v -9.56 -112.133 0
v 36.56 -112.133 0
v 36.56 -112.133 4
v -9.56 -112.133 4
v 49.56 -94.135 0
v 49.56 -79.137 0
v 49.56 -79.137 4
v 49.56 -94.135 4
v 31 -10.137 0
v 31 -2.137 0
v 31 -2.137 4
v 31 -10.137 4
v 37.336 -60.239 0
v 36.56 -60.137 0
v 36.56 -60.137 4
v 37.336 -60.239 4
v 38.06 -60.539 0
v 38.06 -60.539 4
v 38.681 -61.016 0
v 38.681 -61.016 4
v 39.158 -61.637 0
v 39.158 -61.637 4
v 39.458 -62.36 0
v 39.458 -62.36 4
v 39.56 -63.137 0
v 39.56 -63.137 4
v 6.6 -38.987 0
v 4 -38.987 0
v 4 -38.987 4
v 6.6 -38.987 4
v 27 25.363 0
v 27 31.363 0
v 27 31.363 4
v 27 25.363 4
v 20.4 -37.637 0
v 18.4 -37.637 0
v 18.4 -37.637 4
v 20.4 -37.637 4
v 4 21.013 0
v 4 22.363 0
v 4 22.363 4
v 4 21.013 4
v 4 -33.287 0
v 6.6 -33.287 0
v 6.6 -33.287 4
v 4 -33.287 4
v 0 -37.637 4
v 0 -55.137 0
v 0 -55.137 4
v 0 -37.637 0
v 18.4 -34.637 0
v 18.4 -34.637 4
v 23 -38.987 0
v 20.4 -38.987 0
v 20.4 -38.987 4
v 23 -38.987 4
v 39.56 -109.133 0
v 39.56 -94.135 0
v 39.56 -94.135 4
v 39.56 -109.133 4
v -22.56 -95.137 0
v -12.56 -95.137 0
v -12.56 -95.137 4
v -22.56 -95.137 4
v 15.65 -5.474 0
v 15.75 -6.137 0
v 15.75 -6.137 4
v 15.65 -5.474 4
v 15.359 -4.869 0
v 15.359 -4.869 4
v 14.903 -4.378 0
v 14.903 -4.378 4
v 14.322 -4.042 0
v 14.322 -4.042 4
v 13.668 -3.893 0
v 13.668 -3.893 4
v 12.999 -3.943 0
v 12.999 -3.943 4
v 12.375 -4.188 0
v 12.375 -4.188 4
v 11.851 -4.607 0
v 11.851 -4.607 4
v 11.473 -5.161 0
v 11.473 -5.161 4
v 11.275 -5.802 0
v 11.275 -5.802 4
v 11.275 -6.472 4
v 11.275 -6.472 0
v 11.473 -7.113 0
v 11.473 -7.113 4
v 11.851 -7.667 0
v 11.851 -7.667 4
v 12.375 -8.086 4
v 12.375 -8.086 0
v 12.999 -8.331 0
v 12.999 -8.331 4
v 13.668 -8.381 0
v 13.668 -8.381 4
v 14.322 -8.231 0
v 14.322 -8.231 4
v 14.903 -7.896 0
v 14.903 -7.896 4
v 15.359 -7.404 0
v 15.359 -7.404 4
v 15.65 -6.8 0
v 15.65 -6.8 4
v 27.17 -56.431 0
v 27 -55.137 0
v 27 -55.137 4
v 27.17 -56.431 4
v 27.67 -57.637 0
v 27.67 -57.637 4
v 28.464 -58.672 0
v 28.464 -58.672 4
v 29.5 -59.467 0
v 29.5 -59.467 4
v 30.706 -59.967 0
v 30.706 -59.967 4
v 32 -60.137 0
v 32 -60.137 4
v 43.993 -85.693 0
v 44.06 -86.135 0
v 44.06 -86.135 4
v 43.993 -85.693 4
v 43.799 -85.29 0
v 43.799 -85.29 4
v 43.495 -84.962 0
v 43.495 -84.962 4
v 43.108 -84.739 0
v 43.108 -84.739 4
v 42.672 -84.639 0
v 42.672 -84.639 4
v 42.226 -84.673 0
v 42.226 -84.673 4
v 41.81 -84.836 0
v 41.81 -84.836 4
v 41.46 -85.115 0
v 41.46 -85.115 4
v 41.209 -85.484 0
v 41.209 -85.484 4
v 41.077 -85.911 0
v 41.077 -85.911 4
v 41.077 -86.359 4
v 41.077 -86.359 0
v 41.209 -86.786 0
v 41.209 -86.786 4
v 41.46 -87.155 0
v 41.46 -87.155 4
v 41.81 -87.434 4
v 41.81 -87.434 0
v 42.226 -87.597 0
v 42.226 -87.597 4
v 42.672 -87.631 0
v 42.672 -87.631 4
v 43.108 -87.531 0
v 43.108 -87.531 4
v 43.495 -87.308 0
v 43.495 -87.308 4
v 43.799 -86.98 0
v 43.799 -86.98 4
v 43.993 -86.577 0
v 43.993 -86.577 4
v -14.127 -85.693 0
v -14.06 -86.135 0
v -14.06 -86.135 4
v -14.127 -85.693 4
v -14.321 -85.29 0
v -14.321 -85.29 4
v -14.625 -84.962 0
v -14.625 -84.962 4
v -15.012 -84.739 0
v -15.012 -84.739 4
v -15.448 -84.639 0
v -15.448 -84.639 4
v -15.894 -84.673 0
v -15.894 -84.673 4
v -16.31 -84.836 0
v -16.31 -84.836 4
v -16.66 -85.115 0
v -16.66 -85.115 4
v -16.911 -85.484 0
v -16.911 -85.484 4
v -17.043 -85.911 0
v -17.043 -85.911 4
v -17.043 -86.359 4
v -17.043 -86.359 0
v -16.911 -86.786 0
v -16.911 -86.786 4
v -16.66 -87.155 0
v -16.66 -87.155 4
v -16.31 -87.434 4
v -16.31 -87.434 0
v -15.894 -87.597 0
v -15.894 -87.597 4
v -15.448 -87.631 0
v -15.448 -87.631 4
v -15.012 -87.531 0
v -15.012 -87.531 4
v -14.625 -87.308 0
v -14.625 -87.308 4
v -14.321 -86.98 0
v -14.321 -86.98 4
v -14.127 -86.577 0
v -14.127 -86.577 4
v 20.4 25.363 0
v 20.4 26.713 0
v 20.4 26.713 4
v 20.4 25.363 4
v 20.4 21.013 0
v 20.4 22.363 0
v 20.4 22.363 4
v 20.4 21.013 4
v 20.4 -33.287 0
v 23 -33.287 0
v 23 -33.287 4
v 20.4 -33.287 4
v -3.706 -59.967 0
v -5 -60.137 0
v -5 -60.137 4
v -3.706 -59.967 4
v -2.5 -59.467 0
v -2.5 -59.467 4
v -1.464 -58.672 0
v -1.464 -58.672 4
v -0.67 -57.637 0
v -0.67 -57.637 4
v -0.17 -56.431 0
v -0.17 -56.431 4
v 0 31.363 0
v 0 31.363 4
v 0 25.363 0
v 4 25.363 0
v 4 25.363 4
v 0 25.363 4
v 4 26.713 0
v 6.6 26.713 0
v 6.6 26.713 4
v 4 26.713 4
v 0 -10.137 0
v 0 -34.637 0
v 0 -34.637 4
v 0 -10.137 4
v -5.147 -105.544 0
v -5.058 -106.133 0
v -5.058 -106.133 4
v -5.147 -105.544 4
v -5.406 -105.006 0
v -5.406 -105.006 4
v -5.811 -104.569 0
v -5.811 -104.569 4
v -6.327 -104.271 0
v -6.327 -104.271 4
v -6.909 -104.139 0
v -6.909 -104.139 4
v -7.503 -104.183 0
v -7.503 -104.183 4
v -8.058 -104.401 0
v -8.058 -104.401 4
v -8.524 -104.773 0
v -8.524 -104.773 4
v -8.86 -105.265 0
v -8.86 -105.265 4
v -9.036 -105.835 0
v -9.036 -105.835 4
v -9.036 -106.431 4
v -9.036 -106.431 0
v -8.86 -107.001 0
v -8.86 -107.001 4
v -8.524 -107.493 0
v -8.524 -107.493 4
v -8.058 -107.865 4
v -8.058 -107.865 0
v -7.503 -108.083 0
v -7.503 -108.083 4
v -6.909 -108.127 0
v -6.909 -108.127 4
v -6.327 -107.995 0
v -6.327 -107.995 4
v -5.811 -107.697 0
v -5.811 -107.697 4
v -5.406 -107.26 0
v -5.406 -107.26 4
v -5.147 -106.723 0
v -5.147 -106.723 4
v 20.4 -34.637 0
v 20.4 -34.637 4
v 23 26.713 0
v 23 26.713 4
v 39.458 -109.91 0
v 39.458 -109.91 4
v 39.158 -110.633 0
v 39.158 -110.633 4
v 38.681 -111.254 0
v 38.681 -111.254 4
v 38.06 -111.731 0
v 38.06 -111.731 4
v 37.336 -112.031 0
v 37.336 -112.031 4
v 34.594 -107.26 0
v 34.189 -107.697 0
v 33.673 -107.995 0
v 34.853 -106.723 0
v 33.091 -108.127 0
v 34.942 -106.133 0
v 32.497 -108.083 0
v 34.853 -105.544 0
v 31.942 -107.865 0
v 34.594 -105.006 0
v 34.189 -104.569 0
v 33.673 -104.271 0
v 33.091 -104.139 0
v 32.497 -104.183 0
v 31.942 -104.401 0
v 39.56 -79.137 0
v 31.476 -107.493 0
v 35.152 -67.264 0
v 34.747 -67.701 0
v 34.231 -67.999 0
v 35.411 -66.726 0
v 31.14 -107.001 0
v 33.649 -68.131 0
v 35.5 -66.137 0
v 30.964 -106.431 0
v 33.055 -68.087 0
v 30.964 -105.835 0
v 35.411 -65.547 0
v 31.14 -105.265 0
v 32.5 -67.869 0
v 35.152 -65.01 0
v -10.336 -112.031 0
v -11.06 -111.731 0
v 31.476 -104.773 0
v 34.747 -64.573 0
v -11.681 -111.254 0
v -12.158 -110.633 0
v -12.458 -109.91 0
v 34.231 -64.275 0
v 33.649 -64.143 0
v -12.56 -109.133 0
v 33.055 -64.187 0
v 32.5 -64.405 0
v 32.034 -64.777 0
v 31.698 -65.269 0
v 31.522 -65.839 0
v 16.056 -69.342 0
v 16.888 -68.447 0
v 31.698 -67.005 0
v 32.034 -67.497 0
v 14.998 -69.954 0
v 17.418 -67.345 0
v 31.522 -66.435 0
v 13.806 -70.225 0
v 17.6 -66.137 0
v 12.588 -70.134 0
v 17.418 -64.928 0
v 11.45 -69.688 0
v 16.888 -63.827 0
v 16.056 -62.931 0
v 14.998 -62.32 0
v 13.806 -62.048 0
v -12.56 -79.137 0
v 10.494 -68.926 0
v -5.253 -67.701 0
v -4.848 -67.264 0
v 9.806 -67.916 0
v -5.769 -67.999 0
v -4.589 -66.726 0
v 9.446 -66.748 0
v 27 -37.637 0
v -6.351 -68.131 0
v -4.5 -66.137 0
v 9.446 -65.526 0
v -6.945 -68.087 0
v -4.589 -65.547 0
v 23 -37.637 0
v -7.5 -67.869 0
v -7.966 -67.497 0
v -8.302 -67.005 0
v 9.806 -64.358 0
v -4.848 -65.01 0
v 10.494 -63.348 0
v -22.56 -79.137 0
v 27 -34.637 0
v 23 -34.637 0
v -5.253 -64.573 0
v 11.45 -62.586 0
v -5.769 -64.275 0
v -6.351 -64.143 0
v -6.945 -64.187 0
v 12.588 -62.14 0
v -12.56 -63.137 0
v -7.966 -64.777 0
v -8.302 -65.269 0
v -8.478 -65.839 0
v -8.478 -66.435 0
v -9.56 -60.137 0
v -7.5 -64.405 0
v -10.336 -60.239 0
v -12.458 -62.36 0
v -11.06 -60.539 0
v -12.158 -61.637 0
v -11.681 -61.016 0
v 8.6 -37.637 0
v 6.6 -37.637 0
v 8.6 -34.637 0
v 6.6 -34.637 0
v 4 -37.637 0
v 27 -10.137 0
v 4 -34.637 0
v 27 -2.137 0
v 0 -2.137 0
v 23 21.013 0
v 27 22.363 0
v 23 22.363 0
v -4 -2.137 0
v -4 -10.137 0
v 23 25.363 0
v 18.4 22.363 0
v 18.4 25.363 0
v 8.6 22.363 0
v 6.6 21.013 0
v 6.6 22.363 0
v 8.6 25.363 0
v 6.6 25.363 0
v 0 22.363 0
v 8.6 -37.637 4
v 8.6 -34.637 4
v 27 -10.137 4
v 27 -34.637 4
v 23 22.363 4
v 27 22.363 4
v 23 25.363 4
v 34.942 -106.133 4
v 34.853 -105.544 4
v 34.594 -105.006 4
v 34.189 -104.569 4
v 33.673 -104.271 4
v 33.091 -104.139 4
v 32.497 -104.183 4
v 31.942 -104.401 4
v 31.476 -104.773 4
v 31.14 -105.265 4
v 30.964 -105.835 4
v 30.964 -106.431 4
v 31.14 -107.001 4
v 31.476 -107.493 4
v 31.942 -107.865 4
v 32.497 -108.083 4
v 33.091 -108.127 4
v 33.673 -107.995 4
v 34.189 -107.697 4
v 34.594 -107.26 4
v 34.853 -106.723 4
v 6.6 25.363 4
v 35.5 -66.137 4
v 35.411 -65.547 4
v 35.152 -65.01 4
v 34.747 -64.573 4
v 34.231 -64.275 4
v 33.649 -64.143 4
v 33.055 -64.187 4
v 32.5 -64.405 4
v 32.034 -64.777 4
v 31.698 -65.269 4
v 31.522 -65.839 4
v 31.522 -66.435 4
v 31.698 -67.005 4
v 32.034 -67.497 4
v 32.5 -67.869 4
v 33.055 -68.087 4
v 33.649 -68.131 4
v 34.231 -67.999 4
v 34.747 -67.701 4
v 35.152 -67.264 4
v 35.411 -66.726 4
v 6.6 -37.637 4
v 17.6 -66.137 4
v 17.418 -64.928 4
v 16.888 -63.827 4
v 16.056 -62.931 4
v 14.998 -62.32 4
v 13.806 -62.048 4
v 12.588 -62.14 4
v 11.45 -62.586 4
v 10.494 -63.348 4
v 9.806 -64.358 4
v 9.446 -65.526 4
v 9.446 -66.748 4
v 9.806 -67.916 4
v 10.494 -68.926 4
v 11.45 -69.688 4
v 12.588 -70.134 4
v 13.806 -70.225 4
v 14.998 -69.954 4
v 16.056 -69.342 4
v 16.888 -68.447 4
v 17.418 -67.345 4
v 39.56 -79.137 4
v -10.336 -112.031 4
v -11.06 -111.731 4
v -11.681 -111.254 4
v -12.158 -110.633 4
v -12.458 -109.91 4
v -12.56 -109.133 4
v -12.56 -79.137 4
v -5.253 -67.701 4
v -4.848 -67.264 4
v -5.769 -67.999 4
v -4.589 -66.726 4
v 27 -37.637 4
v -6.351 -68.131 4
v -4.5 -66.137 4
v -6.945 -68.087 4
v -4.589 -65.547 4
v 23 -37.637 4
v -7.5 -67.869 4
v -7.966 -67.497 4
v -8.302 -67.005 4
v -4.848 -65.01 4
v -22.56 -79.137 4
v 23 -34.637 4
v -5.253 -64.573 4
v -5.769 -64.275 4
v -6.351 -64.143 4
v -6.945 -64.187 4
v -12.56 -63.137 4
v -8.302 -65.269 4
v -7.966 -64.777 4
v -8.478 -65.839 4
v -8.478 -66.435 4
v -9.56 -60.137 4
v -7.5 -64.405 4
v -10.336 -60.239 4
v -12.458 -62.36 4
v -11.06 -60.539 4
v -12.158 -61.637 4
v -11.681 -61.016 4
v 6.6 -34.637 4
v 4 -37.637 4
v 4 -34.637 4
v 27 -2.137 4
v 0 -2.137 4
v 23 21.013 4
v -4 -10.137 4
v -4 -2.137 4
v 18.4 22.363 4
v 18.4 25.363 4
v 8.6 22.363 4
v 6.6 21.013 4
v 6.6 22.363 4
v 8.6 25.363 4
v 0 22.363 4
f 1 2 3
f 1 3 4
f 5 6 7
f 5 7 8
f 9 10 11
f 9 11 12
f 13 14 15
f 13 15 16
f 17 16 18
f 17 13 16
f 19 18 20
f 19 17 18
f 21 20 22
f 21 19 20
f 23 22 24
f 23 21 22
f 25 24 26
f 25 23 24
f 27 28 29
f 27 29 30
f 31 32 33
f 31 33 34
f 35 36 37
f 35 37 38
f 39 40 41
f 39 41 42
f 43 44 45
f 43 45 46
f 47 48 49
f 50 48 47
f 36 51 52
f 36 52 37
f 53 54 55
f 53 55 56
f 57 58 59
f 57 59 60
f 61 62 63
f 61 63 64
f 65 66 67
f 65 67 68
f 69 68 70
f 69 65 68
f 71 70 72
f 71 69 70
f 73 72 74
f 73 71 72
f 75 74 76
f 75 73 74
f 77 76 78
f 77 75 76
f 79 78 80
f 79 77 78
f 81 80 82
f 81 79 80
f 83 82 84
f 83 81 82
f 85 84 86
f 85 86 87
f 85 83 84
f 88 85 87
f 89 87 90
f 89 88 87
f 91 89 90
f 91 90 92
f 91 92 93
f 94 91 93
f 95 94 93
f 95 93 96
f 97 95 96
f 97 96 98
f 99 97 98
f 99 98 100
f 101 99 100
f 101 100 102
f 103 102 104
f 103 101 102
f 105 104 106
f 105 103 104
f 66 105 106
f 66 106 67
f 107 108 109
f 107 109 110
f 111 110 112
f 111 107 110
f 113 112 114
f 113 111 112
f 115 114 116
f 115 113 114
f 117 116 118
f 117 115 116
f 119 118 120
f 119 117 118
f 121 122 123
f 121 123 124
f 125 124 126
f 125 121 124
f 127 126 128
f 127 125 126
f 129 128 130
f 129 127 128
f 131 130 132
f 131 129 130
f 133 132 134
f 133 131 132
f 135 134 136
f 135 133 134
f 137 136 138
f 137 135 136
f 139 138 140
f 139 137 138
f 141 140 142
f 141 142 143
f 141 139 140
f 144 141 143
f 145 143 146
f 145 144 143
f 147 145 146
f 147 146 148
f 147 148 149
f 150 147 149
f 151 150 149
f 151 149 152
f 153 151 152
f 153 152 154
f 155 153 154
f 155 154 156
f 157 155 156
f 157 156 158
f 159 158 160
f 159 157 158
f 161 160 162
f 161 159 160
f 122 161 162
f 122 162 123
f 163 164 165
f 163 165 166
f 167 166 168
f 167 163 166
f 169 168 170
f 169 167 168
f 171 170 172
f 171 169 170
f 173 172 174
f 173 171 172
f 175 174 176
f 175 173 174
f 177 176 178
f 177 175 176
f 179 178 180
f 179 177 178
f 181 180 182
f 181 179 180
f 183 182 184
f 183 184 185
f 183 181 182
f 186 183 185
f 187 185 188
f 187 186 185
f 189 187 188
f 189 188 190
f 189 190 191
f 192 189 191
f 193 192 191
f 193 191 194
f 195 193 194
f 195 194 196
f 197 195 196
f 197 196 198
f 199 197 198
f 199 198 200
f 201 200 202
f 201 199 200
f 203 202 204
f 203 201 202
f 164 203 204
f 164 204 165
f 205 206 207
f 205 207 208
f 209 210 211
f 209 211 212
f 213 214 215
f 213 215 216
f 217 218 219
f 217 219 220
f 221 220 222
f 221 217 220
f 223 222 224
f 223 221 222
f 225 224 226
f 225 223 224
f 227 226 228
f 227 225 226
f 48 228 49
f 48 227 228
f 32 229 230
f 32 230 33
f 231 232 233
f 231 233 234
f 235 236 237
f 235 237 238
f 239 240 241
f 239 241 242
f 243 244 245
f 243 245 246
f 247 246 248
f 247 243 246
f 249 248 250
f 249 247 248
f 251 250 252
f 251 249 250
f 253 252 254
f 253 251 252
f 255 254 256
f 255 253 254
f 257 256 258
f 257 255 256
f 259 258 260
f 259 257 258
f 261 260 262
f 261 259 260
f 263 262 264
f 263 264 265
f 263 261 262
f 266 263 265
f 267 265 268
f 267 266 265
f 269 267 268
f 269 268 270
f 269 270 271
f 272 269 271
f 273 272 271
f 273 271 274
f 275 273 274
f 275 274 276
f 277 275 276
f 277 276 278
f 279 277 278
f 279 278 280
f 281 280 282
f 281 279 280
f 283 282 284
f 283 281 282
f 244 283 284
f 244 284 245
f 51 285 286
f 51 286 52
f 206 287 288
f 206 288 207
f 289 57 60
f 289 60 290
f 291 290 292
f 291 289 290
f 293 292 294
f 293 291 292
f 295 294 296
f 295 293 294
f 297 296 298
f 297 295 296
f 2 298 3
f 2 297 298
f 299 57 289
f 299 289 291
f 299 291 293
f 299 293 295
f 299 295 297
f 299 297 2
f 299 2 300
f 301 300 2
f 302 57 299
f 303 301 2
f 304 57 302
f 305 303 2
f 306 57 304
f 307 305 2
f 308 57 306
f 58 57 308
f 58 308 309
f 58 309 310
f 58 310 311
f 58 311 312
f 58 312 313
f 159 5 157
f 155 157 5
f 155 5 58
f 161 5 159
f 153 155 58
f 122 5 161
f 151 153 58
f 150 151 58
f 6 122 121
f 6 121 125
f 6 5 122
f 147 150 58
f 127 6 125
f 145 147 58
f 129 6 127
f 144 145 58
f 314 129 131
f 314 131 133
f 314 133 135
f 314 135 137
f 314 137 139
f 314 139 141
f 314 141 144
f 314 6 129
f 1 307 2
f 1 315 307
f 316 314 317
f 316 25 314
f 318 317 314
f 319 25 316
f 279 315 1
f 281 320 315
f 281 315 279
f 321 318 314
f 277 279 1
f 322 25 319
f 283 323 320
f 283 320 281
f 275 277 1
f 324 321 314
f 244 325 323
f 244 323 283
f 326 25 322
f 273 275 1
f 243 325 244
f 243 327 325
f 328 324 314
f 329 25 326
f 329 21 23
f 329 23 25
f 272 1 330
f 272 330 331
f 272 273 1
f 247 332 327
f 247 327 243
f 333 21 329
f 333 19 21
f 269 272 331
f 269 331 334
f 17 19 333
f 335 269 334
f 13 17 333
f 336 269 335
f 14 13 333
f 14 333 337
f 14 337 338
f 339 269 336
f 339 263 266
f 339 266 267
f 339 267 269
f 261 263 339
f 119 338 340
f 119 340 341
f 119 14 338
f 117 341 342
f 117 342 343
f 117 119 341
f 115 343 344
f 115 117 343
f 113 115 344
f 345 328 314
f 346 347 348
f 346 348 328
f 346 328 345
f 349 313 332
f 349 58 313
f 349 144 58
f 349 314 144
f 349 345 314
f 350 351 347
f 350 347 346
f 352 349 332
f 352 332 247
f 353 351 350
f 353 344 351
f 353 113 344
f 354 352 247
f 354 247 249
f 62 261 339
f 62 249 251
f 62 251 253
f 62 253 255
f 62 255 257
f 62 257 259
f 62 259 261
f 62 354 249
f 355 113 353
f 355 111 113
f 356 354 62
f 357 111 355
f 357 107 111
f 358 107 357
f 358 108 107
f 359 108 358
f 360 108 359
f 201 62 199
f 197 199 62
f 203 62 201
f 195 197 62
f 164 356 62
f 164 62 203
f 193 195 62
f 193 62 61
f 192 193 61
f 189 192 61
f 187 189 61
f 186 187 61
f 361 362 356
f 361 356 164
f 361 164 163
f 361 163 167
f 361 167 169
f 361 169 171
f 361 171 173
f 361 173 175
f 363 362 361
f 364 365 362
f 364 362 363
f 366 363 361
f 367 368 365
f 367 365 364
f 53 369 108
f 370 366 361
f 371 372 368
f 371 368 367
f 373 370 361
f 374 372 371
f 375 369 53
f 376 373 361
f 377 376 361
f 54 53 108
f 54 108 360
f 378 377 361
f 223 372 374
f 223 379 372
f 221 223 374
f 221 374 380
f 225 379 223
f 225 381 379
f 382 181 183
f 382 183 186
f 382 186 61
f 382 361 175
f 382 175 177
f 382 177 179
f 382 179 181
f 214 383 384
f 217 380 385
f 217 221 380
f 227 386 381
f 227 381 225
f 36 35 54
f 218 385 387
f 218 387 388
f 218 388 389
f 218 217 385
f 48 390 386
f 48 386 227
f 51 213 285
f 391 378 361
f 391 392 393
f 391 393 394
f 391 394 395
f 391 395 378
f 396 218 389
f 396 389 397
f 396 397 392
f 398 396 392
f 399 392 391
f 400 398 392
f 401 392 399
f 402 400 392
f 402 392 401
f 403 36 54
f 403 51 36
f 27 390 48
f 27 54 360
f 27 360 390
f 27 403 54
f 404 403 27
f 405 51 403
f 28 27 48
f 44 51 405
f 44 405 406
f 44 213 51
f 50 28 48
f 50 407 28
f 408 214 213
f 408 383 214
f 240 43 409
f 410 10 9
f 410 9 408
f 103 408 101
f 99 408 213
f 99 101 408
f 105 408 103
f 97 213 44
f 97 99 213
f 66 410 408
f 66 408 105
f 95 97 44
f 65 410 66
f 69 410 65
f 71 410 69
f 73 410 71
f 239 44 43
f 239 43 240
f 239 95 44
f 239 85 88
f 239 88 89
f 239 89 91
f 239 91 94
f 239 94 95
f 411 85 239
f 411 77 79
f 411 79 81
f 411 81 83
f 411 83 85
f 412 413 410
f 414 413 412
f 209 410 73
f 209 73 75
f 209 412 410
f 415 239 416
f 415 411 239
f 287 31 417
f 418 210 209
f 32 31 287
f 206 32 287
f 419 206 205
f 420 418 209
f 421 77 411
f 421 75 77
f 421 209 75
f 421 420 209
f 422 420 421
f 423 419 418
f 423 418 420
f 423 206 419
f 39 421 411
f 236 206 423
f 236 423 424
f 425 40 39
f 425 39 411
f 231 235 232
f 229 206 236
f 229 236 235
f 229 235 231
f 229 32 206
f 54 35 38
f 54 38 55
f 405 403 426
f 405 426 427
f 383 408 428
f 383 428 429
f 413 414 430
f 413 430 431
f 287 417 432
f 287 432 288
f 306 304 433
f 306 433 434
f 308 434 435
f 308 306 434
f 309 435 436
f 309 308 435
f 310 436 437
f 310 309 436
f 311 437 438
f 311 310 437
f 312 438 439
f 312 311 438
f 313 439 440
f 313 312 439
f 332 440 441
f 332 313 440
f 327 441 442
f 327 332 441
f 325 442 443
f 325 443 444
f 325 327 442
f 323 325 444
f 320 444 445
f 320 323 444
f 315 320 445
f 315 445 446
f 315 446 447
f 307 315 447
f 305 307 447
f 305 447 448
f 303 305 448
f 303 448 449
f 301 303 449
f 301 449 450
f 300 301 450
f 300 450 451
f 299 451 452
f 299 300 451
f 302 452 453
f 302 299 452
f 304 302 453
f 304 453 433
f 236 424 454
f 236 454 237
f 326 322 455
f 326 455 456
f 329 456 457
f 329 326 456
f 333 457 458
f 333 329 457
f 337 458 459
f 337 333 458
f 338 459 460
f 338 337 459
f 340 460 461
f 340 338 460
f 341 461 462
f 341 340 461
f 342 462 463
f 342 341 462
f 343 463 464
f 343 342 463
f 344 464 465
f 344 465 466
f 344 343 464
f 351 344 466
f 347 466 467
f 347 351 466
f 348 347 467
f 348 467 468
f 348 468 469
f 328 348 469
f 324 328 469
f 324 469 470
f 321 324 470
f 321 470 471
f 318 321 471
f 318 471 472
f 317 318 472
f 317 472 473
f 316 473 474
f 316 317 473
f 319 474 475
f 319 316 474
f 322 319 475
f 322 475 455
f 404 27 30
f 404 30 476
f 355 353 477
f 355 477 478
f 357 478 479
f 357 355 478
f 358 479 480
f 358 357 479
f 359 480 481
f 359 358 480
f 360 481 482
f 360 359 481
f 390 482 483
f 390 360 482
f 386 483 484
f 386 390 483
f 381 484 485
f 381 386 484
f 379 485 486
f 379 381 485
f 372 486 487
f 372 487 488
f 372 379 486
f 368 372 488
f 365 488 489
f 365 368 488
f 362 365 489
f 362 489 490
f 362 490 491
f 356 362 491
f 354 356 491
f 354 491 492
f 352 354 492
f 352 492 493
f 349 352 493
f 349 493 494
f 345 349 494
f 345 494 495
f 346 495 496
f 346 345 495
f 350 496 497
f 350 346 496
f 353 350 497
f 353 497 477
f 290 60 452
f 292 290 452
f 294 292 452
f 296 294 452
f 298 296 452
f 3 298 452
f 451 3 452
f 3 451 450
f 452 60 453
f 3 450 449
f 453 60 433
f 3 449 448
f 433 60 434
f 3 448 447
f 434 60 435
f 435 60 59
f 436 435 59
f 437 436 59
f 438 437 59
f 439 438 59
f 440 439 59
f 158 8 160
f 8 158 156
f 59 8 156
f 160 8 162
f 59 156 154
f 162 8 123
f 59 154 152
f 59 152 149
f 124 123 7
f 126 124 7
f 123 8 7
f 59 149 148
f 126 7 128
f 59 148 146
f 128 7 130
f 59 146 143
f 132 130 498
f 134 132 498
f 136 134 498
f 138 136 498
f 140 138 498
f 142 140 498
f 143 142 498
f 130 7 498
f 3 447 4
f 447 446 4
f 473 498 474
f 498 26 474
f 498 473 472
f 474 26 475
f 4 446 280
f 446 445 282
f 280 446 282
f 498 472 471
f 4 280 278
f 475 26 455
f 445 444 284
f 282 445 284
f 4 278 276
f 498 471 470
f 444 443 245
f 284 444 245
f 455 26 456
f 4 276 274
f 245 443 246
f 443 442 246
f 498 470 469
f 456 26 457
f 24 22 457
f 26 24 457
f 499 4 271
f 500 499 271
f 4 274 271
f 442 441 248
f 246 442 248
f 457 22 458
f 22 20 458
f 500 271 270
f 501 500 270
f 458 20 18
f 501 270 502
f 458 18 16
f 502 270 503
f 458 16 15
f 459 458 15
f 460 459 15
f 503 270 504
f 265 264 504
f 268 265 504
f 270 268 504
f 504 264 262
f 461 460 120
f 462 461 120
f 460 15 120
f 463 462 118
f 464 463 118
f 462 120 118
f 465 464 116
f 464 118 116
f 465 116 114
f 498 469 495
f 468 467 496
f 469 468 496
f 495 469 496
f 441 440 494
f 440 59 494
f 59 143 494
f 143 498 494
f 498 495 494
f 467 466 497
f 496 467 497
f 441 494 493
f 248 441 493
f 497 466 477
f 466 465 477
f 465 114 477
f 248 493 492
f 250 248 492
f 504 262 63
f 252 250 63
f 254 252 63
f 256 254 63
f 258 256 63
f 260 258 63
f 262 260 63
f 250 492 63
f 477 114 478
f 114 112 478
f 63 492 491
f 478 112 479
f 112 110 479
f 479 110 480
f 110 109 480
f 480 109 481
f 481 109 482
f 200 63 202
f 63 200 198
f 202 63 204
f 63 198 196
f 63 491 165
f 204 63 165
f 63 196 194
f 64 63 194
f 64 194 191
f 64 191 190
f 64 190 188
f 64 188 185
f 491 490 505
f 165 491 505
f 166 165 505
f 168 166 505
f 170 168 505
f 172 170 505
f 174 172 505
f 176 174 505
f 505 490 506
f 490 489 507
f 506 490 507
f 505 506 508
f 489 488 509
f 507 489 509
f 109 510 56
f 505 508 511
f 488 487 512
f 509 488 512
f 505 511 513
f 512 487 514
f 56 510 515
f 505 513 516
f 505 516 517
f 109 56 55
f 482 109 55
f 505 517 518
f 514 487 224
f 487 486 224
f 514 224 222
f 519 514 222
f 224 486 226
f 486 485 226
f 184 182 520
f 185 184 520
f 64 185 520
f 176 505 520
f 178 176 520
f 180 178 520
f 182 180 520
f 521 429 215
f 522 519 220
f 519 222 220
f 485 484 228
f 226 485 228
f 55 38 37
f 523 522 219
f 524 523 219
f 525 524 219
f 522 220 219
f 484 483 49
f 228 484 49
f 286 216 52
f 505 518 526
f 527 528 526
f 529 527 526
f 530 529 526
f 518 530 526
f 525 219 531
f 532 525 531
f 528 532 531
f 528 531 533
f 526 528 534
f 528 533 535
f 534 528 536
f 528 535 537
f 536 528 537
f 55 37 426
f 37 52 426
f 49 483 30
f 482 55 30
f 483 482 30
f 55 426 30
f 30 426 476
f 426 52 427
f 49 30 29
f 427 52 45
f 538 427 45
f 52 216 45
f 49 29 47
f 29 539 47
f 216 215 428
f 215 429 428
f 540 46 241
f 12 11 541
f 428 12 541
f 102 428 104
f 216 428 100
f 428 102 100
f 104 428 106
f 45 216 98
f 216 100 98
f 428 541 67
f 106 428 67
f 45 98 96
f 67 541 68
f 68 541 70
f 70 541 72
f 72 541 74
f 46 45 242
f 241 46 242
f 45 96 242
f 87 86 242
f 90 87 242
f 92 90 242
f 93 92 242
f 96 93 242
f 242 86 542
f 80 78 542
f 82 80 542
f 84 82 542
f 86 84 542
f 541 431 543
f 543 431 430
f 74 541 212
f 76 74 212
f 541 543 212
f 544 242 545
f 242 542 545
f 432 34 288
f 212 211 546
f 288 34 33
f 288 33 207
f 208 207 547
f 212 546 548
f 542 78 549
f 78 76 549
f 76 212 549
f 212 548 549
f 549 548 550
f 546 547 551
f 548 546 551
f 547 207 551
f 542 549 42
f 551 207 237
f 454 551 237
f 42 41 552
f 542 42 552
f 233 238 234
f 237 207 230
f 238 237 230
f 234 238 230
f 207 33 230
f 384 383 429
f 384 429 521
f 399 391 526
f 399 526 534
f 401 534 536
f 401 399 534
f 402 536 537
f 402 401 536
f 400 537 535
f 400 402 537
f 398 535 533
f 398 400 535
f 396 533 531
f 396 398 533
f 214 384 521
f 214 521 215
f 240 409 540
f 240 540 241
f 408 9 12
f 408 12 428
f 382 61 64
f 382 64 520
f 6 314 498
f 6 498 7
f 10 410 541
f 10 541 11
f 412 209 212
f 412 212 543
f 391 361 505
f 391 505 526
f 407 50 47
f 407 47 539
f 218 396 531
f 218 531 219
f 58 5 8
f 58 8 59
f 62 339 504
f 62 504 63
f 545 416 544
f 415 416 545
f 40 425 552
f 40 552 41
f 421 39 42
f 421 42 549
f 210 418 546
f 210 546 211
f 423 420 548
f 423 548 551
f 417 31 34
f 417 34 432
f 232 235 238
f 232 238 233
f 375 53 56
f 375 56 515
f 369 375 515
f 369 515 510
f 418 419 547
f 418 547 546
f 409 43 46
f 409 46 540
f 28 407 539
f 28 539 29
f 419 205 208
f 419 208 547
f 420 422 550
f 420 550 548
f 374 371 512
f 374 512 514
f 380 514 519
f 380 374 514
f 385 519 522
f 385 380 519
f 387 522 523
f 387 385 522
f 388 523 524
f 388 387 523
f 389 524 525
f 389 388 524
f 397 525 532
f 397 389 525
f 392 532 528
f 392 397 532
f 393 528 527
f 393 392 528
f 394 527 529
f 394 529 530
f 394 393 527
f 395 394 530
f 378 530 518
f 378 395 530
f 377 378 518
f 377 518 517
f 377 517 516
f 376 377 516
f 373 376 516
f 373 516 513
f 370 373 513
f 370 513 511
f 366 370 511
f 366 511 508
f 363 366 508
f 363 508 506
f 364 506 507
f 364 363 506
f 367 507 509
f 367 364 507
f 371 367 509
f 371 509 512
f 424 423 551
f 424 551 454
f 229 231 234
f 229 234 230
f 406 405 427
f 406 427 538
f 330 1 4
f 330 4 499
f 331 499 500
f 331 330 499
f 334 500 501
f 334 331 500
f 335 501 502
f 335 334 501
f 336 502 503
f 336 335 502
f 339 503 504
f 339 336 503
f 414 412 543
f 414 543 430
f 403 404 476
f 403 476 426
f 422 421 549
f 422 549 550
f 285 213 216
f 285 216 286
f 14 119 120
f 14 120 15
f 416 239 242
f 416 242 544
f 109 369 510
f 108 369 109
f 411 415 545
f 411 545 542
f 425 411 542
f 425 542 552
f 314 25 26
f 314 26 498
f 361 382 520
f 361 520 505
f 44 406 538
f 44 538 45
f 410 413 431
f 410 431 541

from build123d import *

# Parameters (mm, degrees)
SKETCH_1_R      = 2.25
SKETCH_1_R_2    = 2
SKETCH_1_R_3    = 4.1
SKETCH_1_R_4    = 1.5
EXTRUDE_1_DEPTH = 4


with BuildPart() as part:
    # 草图1 → 凸台-拉伸1 (new body)
    with BuildSketch(Plane.XY):
        with BuildLine():
            Line((0, -10.136956522), (-4, -10.136956522))
            Line((-4, -10.136956522), (-4, -2.136956522))
            Line((-4, -2.136956522), (0, -2.136956522))
            Line((0, -2.136956522), (0, 22.363043478))
            Line((0, 22.363043478), (4, 22.363043478))
            Line((4, 22.363043478), (4, 21.013043478))
            Line((4, 21.013043478), (6.6, 21.013043478))
            Line((6.6, 21.013043478), (6.6, 22.363043478))
            Line((6.6, 22.363043478), (8.6, 22.363043478))
            Line((8.6, 22.363043478), (8.6, 25.363043478))
            Line((8.6, 25.363043478), (6.6, 25.363043478))
            Line((6.6, 25.363043478), (6.6, 26.713043478))
            Line((6.6, 26.713043478), (4, 26.713043478))
            Line((4, 26.713043478), (4, 25.363043478))
            Line((4, 25.363043478), (0, 25.363043478))
            Line((0, 25.363043478), (0, 31.363043478))
            Line((0, 31.363043478), (27, 31.363043478))
            Line((27, 31.363043478), (27, 25.363043478))
            Line((27, 25.363043478), (23, 25.363043478))
            Line((23, 25.363043478), (23, 26.713043478))
            Line((23, 26.713043478), (20.4, 26.713043478))
            Line((20.4, 26.713043478), (20.4, 25.363043478))
            Line((20.4, 25.363043478), (18.4, 25.363043478))
            Line((18.4, 25.363043478), (18.4, 22.363043478))
            Line((18.4, 22.363043478), (20.4, 22.363043478))
            Line((20.4, 22.363043478), (20.4, 21.013043478))
            Line((20.4, 21.013043478), (23, 21.013043478))
            Line((23, 21.013043478), (23, 22.363043478))
            Line((23, 22.363043478), (27, 22.363043478))
            Line((27, 22.363043478), (27, -2.136956522))
            Line((27, -2.136956522), (31, -2.136956522))
            Line((31, -2.136956522), (31, -10.136956522))
            Line((31, -10.136956522), (27, -10.136956522))
            Line((27, -10.136956522), (27, -34.636956522))
            Line((27, -34.636956522), (23, -34.636956522))
            Line((23, -34.636956522), (23, -33.286956522))
            Line((23, -33.286956522), (20.4, -33.286956522))
            Line((20.4, -33.286956522), (20.4, -34.636956522))
            Line((20.4, -34.636956522), (18.4, -34.636956522))
            Line((18.4, -34.636956522), (18.4, -37.636956522))
            Line((18.4, -37.636956522), (20.4, -37.636956522))
            Line((20.4, -37.636956522), (20.4, -38.986956522))
            Line((20.4, -38.986956522), (23, -38.986956522))
            Line((23, -38.986956522), (23, -37.636956522))
            Line((23, -37.636956522), (27, -37.636956522))
            Line((27, -37.636956522), (27, -55.136956522))
            ThreePointArc((27, -55.136956522), (28.464466094, -58.672490428), (32, -60.136956522))
            Line((32, -60.136956522), (36.56, -60.136956522))
            ThreePointArc((36.56, -60.136956522), (38.681320344, -61.015636178), (39.56, -63.136956522))
            Line((39.56, -63.136956522), (39.56, -79.136956522))
            Line((39.56, -79.136956522), (49.56, -79.136956522))
            Line((49.56, -79.136956522), (49.56, -94.135010438))
            Line((49.56, -94.135010438), (39.56, -94.135010438))
            Line((39.56, -94.135010438), (39.56, -109.133064354))
            ThreePointArc((39.56, -109.133064354), (38.681320344, -111.254384698), (36.56, -112.133064354))
            Line((36.56, -112.133064354), (-9.56, -112.133064354))
            ThreePointArc((-9.56, -112.133064354), (-11.681320344, -111.254384698), (-12.56, -109.133064354))
            Line((-12.56, -109.133064354), (-12.56, -95.136956522))
            Line((-12.56, -95.136956522), (-22.56, -95.136956522))
            Line((-22.56, -95.136956522), (-22.56, -79.136956522))
            Line((-22.56, -79.136956522), (-12.56, -79.136956522))
            Line((-12.56, -79.136956522), (-12.56, -63.136956522))
            ThreePointArc((-12.56, -63.136956522), (-11.681320344, -61.015636178), (-9.56, -60.136956522))
            Line((-9.56, -60.136956522), (-5, -60.136956522))
            ThreePointArc((-5, -60.136956522), (-1.464466094, -58.672490428), (0, -55.136956522))
            Line((0, -55.136956522), (0, -37.636956522))
            Line((0, -37.636956522), (4, -37.636956522))
            Line((4, -37.636956522), (4, -38.986956522))
            Line((4, -38.986956522), (6.6, -38.986956522))
            Line((6.6, -38.986956522), (6.6, -37.636956522))
            Line((6.6, -37.636956522), (8.6, -37.636956522))
            Line((8.6, -37.636956522), (8.6, -34.636956522))
            Line((8.6, -34.636956522), (6.6, -34.636956522))
            Line((6.6, -34.636956522), (6.6, -33.286956522))
            Line((6.6, -33.286956522), (4, -33.286956522))
            Line((4, -33.286956522), (4, -34.636956522))
            Line((4, -34.636956522), (0, -34.636956522))
            Line((0, -34.636956522), (0, -10.136956522))
        make_face()
        with Locations((13.5, -6.136956522)):
            Circle(SKETCH_1_R, mode=Mode.SUBTRACT)
        with Locations((-6.5, -66.136956522)):
            Circle(SKETCH_1_R_2, mode=Mode.SUBTRACT)
        with Locations((-7.057994831, -106.133064354)):
            Circle(SKETCH_1_R_2, mode=Mode.SUBTRACT)
        with Locations((32.942005169, -106.133064354)):
            Circle(SKETCH_1_R_2, mode=Mode.SUBTRACT)
        with Locations((33.5, -66.136956522)):
            Circle(SKETCH_1_R_2, mode=Mode.SUBTRACT)
        with Locations((13.5, -66.136956522)):
            Circle(SKETCH_1_R_3, mode=Mode.SUBTRACT)
        with Locations((-15.56, -86.135010438)):
            Circle(SKETCH_1_R_4, mode=Mode.SUBTRACT)
        with Locations((42.56, -86.135010438)):
            Circle(SKETCH_1_R_4, mode=Mode.SUBTRACT)
    extrude(amount=EXTRUDE_1_DEPTH)


solid = part.part
